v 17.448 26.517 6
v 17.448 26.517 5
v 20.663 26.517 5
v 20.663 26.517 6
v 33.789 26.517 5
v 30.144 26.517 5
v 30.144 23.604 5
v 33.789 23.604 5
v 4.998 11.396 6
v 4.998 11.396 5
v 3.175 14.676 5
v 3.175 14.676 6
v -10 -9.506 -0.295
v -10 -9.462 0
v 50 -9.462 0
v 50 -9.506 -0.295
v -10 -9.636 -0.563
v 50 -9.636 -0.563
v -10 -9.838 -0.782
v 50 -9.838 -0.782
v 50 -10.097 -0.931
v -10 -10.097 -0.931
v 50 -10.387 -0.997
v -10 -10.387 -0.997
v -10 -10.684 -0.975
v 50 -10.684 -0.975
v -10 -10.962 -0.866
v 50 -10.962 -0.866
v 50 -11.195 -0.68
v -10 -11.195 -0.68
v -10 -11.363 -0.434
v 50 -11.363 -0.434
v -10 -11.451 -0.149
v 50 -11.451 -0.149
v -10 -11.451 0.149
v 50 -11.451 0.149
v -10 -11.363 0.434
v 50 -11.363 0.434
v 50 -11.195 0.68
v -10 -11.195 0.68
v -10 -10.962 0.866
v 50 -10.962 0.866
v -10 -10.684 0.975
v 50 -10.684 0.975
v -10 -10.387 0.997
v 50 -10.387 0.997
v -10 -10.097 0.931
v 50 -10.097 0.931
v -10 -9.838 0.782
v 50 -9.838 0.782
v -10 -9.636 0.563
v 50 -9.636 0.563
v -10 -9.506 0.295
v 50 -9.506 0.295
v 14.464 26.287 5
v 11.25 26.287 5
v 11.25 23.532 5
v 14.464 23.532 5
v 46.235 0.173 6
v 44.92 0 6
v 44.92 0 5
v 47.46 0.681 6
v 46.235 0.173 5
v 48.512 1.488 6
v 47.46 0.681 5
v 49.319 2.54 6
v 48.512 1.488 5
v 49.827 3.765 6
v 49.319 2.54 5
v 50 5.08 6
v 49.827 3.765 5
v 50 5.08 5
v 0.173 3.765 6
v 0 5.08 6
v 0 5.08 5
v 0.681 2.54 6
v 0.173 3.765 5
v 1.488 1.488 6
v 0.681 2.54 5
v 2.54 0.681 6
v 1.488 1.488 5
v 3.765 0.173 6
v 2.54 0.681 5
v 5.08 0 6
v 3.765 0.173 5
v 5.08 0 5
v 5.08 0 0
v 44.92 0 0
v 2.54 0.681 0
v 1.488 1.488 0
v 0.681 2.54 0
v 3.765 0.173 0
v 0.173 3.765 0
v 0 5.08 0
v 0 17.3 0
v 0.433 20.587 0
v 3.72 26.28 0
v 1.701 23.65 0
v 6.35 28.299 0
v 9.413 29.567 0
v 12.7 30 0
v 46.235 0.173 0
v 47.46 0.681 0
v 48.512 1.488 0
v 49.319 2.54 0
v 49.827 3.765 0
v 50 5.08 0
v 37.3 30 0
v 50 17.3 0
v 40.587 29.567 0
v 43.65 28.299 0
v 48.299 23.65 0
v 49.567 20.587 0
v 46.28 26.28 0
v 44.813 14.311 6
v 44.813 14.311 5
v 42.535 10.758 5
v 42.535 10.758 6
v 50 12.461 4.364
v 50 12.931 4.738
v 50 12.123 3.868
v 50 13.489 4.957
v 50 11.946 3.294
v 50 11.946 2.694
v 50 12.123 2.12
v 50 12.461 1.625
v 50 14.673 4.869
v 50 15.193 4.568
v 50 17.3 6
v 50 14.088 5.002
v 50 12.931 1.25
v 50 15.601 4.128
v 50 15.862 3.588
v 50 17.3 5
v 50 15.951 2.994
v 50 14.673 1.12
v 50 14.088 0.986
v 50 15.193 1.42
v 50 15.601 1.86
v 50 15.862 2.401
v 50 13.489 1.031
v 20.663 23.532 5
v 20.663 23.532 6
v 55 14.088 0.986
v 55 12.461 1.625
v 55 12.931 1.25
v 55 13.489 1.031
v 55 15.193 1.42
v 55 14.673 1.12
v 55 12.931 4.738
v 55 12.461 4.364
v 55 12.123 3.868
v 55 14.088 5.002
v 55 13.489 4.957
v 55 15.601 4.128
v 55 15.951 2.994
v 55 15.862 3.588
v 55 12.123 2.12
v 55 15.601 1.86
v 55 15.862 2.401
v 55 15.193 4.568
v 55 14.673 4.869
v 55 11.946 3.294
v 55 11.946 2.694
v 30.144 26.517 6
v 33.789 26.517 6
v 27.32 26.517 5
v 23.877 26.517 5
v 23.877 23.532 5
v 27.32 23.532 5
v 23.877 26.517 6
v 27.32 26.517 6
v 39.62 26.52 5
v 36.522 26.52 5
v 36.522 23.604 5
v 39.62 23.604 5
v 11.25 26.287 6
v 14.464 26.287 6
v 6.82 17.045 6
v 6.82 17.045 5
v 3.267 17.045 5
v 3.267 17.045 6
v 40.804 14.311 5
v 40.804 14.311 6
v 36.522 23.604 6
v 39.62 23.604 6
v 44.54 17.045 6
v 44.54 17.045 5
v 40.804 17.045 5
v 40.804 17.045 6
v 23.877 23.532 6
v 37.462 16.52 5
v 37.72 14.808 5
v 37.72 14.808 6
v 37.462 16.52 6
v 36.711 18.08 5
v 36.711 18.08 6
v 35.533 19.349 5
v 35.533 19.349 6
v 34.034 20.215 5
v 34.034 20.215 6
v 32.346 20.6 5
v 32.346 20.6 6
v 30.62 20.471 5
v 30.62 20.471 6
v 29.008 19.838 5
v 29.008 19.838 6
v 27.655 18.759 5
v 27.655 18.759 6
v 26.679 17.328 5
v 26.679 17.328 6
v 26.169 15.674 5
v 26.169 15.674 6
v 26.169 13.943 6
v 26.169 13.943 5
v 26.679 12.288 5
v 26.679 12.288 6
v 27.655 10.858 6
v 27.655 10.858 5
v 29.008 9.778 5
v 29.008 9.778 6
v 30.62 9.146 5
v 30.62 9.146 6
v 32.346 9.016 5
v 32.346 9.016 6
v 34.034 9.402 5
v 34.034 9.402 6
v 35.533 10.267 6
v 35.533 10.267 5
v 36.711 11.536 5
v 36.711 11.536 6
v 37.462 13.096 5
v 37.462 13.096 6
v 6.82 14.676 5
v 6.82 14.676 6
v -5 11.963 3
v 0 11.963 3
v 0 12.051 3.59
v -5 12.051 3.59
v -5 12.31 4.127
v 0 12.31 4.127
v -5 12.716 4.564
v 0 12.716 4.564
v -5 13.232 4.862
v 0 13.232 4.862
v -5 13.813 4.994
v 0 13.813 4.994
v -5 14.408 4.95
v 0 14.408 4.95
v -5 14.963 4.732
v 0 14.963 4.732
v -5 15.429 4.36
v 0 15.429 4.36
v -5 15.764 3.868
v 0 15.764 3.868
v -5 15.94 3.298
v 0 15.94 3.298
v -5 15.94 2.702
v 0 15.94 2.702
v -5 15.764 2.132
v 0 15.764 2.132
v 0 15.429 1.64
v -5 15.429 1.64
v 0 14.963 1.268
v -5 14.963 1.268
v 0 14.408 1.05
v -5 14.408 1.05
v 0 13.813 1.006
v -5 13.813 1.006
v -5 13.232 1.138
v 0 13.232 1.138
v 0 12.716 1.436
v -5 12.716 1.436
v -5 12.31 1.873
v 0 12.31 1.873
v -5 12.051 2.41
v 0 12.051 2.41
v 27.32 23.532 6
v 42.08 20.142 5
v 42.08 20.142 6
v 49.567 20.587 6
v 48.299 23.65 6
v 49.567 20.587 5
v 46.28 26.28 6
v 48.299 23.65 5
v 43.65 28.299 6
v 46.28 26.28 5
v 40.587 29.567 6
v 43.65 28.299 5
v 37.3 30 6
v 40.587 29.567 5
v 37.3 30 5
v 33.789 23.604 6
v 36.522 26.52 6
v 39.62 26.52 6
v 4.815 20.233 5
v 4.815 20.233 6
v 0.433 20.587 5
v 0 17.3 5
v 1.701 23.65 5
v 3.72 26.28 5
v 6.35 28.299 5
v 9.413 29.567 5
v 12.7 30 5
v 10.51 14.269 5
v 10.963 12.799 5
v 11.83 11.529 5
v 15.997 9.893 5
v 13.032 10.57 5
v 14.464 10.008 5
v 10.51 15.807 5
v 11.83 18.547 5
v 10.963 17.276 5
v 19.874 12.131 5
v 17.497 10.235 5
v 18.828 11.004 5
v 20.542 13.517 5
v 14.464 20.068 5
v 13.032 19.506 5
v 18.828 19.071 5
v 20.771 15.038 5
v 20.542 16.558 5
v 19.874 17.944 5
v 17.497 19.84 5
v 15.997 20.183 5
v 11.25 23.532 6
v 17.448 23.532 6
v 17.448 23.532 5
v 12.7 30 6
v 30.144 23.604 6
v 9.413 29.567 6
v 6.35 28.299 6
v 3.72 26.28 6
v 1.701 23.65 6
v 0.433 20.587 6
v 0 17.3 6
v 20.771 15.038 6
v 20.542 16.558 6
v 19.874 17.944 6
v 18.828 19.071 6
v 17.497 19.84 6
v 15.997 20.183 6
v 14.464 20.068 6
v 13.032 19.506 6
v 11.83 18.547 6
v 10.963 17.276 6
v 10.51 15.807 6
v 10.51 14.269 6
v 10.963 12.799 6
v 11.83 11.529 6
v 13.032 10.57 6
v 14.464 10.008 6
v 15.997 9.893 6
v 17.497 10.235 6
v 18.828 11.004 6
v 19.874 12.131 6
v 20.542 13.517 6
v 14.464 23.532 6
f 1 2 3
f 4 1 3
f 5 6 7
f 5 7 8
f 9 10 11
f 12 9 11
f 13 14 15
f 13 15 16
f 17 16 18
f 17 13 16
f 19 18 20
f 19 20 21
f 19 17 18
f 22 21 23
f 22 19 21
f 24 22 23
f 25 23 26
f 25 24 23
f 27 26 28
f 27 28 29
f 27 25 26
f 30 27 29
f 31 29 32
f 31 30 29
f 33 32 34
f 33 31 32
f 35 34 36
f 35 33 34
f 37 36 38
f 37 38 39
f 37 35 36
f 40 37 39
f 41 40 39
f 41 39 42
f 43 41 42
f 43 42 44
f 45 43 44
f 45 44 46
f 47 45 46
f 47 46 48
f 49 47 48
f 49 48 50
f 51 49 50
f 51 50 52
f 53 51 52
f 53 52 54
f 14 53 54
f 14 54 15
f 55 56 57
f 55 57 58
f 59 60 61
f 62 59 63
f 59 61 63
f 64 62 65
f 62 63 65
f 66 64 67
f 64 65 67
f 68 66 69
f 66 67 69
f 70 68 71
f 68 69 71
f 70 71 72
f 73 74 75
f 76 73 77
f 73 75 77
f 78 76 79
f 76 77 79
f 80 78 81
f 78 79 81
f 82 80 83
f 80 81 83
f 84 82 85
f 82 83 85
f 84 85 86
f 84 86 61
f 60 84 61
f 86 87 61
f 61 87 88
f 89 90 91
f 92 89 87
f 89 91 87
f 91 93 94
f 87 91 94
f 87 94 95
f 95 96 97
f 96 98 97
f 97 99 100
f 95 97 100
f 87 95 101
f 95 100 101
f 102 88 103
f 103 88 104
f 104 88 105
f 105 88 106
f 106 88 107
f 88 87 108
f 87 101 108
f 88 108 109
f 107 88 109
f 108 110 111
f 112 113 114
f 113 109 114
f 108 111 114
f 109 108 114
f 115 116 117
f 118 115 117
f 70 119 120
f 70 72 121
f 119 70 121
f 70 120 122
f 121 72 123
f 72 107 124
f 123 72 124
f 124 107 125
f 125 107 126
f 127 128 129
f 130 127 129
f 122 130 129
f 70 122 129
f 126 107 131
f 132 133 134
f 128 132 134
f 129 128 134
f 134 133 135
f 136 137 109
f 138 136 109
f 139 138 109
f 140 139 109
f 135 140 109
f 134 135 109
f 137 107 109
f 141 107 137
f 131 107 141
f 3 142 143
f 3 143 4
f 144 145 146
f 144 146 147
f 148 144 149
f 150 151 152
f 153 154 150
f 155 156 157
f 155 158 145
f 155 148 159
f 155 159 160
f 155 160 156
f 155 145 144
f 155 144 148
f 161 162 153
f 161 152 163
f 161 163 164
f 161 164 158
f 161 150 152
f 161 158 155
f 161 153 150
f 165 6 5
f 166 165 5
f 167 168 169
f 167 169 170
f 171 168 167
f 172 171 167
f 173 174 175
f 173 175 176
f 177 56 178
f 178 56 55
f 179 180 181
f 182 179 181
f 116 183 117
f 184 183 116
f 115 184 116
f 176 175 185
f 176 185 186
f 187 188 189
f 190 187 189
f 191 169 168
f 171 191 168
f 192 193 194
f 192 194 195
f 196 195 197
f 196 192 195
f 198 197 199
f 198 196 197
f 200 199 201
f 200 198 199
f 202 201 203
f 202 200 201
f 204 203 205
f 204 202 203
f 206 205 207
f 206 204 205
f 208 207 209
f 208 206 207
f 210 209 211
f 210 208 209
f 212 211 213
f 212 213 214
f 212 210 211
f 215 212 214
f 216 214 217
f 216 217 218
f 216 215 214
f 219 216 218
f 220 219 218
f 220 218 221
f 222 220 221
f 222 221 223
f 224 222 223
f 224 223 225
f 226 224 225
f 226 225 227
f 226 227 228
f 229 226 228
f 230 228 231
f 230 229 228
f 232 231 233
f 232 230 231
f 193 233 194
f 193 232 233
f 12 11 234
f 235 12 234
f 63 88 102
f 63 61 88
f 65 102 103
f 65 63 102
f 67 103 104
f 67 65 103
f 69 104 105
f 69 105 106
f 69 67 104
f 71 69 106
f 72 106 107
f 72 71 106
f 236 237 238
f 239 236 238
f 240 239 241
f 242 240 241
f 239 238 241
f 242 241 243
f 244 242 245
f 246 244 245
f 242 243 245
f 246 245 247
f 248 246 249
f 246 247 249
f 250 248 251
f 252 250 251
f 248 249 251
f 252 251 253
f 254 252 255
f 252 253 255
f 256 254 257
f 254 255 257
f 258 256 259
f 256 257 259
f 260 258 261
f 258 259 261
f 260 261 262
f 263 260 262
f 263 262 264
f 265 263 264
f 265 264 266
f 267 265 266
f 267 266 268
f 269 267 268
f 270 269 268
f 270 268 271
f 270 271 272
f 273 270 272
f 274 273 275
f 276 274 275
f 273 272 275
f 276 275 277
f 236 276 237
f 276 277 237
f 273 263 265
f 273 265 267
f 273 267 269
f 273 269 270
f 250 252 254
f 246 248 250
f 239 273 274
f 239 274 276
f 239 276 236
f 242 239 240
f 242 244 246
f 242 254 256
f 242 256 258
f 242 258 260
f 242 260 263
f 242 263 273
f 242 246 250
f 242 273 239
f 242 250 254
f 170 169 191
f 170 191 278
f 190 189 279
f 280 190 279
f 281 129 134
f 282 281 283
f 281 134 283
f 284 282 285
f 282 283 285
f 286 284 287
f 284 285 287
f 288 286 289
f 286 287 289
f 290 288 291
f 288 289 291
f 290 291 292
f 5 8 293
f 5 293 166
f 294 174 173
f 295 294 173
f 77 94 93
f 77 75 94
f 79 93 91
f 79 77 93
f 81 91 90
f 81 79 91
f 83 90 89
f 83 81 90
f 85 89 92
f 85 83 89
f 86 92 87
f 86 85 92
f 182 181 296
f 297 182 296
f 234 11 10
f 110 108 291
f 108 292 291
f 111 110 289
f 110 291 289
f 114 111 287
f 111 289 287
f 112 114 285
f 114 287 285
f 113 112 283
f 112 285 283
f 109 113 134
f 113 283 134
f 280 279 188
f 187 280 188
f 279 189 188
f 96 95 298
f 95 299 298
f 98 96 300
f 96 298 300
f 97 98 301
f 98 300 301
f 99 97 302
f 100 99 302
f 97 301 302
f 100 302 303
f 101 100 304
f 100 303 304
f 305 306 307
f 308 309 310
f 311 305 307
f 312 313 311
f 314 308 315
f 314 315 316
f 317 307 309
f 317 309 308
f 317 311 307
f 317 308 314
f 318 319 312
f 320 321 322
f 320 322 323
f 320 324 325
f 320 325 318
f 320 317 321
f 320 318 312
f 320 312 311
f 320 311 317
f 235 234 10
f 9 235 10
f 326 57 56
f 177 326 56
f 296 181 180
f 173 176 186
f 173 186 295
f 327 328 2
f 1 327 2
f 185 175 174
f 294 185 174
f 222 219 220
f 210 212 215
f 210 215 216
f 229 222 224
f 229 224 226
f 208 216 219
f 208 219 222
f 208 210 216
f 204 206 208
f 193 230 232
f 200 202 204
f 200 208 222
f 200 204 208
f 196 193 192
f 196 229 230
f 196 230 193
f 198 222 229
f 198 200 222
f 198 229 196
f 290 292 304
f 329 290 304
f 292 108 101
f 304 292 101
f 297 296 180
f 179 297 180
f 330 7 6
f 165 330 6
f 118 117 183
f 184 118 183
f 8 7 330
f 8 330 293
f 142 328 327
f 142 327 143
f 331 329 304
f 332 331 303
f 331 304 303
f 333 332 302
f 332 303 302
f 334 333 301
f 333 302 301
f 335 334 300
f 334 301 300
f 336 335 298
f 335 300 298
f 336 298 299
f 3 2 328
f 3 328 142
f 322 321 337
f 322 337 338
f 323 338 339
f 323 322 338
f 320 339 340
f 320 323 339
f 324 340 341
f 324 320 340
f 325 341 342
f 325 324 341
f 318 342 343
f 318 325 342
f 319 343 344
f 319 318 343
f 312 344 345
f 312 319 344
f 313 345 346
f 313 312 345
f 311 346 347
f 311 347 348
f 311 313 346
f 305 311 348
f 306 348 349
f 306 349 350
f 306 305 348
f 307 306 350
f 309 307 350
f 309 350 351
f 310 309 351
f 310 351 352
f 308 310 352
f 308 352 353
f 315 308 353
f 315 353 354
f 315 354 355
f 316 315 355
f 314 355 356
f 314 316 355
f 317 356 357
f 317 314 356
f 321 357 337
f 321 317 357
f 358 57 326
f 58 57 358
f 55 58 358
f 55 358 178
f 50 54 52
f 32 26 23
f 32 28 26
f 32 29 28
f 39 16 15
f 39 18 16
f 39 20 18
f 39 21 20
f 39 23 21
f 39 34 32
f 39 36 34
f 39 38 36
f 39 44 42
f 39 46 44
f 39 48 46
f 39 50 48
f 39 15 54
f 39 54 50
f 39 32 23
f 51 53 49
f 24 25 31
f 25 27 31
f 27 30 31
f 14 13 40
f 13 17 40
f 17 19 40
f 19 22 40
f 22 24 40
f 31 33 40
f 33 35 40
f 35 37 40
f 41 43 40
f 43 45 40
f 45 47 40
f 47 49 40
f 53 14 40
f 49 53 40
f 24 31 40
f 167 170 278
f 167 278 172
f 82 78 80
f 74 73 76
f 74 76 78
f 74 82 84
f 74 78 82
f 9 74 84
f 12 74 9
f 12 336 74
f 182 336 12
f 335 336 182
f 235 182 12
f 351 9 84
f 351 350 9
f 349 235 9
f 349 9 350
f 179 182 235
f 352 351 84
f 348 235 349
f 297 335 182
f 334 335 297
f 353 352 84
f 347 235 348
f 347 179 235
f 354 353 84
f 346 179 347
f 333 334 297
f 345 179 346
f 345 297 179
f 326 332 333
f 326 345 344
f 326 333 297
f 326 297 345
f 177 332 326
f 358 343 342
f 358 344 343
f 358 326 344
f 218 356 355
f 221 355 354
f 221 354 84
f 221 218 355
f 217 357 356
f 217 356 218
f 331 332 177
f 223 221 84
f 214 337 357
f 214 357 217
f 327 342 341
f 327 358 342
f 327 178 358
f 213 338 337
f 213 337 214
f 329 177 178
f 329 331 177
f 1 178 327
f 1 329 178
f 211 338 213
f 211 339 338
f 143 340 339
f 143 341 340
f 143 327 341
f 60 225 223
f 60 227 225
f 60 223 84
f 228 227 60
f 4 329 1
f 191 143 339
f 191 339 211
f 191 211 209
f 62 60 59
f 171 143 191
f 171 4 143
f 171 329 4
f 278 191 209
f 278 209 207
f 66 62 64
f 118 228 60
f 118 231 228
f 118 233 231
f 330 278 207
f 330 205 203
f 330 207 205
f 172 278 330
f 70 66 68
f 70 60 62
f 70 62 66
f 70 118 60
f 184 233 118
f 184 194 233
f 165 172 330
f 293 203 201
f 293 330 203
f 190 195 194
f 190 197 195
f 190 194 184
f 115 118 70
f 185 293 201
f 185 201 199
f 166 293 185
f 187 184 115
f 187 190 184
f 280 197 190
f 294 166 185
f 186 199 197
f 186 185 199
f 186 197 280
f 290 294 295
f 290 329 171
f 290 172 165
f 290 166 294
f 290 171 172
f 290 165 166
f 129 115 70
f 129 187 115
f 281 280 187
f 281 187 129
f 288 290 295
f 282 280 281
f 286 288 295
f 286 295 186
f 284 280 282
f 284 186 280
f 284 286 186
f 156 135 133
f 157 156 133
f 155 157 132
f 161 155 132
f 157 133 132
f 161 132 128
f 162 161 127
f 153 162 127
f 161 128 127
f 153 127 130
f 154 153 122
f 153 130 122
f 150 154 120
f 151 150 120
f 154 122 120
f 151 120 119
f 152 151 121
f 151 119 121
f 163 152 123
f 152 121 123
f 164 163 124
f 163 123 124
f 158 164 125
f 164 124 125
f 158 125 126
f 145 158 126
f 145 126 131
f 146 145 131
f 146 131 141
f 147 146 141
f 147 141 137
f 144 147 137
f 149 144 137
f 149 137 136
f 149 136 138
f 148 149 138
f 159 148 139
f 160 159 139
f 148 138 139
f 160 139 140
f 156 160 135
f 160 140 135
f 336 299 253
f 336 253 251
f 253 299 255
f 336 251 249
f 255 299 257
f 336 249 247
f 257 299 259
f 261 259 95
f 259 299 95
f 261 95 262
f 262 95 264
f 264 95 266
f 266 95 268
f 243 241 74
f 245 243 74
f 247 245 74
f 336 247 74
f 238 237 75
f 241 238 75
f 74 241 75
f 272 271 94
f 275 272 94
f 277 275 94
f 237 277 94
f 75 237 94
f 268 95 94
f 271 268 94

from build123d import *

# Parameters (mm, degrees)
F0_W      = 50
F0_H      = 30
F1_DEPTH  = 5
F2_R      = 12.7
F3_R      = 12.7
F4_R      = 5.08
F5_R      = 5.08
F6_R      = 5.8080634673
F6_R_2    = 5.159256853
F6_W      = 3.2141748816
F6_H      = 2.7550067753
F6_W_2    = 3.2141786069
F6_H_2    = 2.9845908284
F6_W_3    = 3.4437589347
F6_W_4    = 3.6444179714
F6_H_3    = 2.9124803841
F6_W_5    = 3.0977539718
F6_H_4    = 2.9155332595
F7_DEPTH  = 1
F8_R      = 2
F9_DEPTH  = 5
F11_R     = 2.0136494007
F12_DEPTH = 5
F13_R     = 1


with BuildPart() as f1:
    # F0 (on Top) → F1 (new body)
    with BuildSketch(Plane.XY):
        with Locations((25, 15)):
            Rectangle(F0_W, F0_H)
    extrude(amount=F1_DEPTH)

    # F2
    f2_edges = [f1.edges().sort_by_distance(p)[0] for p in [
        (0, 30, 2.5),
    ]]
    fillet(f2_edges, radius=F2_R)

    # F3
    f3_edges = [f1.edges().sort_by_distance(p)[0] for p in [
        (50, 30, 2.5),
    ]]
    fillet(f3_edges, radius=F3_R)

    # F4
    f4_edges = [f1.edges().sort_by_distance(p)[0] for p in [
        (0, 0, 2.5),
    ]]
    fillet(f4_edges, radius=F4_R)

    # F5
    f5_edges = [f1.edges().sort_by_distance(p)[0] for p in [
        (50, 0, 2.5),
    ]]
    fillet(f5_edges, radius=F5_R)

    # F6 (on face) → F7 (join)
    with BuildSketch(Plane.XY.offset(5)):
        with BuildLine():
            ThreePointArc((0, 5.08), (1.4878975516, 1.4878975516), (5.08, 0))
            Line((5.08, 0), (44.92, 0))
            ThreePointArc((44.92, 0), (48.5121024484, 1.4878975516), (50, 5.08))
            Line((50, 5.08), (50, 17.3))
            ThreePointArc((50, 17.3), (46.2802561211, 26.2802561211), (37.3, 30))
            Line((37.3, 30), (12.7, 30))
            ThreePointArc((12.7, 30), (3.7197438789, 26.2802561211), (0, 17.3))
            Line((0, 17.3), (0, 5.08))
        make_face()
        Polygon((4.9976129085, 11.395663023), (3.17540369, 14.6756386384), (6.8198214285, 14.6756386384), align=None, mode=Mode.SUBTRACT)
        with Locations((31.9121703506, 14.8081630468)):
            Circle(F6_R, mode=Mode.SUBTRACT)
        Polygon((42.5351150334, 10.7578895986), (40.8040173352, 14.3111972138), (44.8128767312, 14.3111972138), align=None, mode=Mode.SUBTRACT)
        Polygon((3.2665142789, 17.0445106924), (4.8153917305, 20.2333759516), (6.8198214285, 17.0445106924), align=None, mode=Mode.SUBTRACT)
        with Locations((15.6117081642, 15.0377471)):
            Circle(F6_R_2, mode=Mode.SUBTRACT)
        with Locations((12.8566995263, 24.9098567292)):
            Rectangle(F6_W, F6_H, mode=Mode.SUBTRACT)
        with Locations((19.0554661676, 25.0246487558)):
            Rectangle(F6_W_2, F6_H_2, mode=Mode.SUBTRACT)
        Polygon((44.5395484567, 17.0445106924), (40.8040173352, 17.0445106924), (42.079564184, 20.1422665268), align=None, mode=Mode.SUBTRACT)
        with Locations((25.59860982, 25.0246487558)):
            Rectangle(F6_W_3, F6_H_2, mode=Mode.SUBTRACT)
        with Locations((31.9663044065, 25.0607039779)):
            Rectangle(F6_W_4, F6_H_3, mode=Mode.SUBTRACT)
        with Locations((38.0707029253, 25.0622304156)):
            Rectangle(F6_W_5, F6_H_4, mode=Mode.SUBTRACT)
    extrude(amount=F7_DEPTH)

    # F8 (on face) → F9 (join)
    with BuildSketch(Plane(origin=(0, 0, 0), x_dir=(0, -1, 0), z_dir=(-1, 0, 0))):
        with Locations((-13.9625295997, 3)):
            Circle(F8_R)
    extrude(amount=F9_DEPTH)

    # F11 (on offset) → F12 (join)
    with BuildSketch(Plane.YZ.offset(50)):
        with Locations((13.9375375584, 2.9941480607)):
            Circle(F11_R)
    extrude(amount=F12_DEPTH)


with BuildPart() as f15:
    # F15: sweep along a path in F14
    with BuildLine(Plane.XY) as f15_path:
        Line((49.9296188354, -10.4407463223), (-10.0703811646, -10.4407463223))
    # F13 (on offset) → F15 (sweep)
    with BuildSketch(Plane.YZ.offset(50)):
        with Locations((-10.4618860946, 0)):
            Circle(F13_R)
    sweep(path=f15_path.line)


solid = Compound([f1.part, f15.part])
